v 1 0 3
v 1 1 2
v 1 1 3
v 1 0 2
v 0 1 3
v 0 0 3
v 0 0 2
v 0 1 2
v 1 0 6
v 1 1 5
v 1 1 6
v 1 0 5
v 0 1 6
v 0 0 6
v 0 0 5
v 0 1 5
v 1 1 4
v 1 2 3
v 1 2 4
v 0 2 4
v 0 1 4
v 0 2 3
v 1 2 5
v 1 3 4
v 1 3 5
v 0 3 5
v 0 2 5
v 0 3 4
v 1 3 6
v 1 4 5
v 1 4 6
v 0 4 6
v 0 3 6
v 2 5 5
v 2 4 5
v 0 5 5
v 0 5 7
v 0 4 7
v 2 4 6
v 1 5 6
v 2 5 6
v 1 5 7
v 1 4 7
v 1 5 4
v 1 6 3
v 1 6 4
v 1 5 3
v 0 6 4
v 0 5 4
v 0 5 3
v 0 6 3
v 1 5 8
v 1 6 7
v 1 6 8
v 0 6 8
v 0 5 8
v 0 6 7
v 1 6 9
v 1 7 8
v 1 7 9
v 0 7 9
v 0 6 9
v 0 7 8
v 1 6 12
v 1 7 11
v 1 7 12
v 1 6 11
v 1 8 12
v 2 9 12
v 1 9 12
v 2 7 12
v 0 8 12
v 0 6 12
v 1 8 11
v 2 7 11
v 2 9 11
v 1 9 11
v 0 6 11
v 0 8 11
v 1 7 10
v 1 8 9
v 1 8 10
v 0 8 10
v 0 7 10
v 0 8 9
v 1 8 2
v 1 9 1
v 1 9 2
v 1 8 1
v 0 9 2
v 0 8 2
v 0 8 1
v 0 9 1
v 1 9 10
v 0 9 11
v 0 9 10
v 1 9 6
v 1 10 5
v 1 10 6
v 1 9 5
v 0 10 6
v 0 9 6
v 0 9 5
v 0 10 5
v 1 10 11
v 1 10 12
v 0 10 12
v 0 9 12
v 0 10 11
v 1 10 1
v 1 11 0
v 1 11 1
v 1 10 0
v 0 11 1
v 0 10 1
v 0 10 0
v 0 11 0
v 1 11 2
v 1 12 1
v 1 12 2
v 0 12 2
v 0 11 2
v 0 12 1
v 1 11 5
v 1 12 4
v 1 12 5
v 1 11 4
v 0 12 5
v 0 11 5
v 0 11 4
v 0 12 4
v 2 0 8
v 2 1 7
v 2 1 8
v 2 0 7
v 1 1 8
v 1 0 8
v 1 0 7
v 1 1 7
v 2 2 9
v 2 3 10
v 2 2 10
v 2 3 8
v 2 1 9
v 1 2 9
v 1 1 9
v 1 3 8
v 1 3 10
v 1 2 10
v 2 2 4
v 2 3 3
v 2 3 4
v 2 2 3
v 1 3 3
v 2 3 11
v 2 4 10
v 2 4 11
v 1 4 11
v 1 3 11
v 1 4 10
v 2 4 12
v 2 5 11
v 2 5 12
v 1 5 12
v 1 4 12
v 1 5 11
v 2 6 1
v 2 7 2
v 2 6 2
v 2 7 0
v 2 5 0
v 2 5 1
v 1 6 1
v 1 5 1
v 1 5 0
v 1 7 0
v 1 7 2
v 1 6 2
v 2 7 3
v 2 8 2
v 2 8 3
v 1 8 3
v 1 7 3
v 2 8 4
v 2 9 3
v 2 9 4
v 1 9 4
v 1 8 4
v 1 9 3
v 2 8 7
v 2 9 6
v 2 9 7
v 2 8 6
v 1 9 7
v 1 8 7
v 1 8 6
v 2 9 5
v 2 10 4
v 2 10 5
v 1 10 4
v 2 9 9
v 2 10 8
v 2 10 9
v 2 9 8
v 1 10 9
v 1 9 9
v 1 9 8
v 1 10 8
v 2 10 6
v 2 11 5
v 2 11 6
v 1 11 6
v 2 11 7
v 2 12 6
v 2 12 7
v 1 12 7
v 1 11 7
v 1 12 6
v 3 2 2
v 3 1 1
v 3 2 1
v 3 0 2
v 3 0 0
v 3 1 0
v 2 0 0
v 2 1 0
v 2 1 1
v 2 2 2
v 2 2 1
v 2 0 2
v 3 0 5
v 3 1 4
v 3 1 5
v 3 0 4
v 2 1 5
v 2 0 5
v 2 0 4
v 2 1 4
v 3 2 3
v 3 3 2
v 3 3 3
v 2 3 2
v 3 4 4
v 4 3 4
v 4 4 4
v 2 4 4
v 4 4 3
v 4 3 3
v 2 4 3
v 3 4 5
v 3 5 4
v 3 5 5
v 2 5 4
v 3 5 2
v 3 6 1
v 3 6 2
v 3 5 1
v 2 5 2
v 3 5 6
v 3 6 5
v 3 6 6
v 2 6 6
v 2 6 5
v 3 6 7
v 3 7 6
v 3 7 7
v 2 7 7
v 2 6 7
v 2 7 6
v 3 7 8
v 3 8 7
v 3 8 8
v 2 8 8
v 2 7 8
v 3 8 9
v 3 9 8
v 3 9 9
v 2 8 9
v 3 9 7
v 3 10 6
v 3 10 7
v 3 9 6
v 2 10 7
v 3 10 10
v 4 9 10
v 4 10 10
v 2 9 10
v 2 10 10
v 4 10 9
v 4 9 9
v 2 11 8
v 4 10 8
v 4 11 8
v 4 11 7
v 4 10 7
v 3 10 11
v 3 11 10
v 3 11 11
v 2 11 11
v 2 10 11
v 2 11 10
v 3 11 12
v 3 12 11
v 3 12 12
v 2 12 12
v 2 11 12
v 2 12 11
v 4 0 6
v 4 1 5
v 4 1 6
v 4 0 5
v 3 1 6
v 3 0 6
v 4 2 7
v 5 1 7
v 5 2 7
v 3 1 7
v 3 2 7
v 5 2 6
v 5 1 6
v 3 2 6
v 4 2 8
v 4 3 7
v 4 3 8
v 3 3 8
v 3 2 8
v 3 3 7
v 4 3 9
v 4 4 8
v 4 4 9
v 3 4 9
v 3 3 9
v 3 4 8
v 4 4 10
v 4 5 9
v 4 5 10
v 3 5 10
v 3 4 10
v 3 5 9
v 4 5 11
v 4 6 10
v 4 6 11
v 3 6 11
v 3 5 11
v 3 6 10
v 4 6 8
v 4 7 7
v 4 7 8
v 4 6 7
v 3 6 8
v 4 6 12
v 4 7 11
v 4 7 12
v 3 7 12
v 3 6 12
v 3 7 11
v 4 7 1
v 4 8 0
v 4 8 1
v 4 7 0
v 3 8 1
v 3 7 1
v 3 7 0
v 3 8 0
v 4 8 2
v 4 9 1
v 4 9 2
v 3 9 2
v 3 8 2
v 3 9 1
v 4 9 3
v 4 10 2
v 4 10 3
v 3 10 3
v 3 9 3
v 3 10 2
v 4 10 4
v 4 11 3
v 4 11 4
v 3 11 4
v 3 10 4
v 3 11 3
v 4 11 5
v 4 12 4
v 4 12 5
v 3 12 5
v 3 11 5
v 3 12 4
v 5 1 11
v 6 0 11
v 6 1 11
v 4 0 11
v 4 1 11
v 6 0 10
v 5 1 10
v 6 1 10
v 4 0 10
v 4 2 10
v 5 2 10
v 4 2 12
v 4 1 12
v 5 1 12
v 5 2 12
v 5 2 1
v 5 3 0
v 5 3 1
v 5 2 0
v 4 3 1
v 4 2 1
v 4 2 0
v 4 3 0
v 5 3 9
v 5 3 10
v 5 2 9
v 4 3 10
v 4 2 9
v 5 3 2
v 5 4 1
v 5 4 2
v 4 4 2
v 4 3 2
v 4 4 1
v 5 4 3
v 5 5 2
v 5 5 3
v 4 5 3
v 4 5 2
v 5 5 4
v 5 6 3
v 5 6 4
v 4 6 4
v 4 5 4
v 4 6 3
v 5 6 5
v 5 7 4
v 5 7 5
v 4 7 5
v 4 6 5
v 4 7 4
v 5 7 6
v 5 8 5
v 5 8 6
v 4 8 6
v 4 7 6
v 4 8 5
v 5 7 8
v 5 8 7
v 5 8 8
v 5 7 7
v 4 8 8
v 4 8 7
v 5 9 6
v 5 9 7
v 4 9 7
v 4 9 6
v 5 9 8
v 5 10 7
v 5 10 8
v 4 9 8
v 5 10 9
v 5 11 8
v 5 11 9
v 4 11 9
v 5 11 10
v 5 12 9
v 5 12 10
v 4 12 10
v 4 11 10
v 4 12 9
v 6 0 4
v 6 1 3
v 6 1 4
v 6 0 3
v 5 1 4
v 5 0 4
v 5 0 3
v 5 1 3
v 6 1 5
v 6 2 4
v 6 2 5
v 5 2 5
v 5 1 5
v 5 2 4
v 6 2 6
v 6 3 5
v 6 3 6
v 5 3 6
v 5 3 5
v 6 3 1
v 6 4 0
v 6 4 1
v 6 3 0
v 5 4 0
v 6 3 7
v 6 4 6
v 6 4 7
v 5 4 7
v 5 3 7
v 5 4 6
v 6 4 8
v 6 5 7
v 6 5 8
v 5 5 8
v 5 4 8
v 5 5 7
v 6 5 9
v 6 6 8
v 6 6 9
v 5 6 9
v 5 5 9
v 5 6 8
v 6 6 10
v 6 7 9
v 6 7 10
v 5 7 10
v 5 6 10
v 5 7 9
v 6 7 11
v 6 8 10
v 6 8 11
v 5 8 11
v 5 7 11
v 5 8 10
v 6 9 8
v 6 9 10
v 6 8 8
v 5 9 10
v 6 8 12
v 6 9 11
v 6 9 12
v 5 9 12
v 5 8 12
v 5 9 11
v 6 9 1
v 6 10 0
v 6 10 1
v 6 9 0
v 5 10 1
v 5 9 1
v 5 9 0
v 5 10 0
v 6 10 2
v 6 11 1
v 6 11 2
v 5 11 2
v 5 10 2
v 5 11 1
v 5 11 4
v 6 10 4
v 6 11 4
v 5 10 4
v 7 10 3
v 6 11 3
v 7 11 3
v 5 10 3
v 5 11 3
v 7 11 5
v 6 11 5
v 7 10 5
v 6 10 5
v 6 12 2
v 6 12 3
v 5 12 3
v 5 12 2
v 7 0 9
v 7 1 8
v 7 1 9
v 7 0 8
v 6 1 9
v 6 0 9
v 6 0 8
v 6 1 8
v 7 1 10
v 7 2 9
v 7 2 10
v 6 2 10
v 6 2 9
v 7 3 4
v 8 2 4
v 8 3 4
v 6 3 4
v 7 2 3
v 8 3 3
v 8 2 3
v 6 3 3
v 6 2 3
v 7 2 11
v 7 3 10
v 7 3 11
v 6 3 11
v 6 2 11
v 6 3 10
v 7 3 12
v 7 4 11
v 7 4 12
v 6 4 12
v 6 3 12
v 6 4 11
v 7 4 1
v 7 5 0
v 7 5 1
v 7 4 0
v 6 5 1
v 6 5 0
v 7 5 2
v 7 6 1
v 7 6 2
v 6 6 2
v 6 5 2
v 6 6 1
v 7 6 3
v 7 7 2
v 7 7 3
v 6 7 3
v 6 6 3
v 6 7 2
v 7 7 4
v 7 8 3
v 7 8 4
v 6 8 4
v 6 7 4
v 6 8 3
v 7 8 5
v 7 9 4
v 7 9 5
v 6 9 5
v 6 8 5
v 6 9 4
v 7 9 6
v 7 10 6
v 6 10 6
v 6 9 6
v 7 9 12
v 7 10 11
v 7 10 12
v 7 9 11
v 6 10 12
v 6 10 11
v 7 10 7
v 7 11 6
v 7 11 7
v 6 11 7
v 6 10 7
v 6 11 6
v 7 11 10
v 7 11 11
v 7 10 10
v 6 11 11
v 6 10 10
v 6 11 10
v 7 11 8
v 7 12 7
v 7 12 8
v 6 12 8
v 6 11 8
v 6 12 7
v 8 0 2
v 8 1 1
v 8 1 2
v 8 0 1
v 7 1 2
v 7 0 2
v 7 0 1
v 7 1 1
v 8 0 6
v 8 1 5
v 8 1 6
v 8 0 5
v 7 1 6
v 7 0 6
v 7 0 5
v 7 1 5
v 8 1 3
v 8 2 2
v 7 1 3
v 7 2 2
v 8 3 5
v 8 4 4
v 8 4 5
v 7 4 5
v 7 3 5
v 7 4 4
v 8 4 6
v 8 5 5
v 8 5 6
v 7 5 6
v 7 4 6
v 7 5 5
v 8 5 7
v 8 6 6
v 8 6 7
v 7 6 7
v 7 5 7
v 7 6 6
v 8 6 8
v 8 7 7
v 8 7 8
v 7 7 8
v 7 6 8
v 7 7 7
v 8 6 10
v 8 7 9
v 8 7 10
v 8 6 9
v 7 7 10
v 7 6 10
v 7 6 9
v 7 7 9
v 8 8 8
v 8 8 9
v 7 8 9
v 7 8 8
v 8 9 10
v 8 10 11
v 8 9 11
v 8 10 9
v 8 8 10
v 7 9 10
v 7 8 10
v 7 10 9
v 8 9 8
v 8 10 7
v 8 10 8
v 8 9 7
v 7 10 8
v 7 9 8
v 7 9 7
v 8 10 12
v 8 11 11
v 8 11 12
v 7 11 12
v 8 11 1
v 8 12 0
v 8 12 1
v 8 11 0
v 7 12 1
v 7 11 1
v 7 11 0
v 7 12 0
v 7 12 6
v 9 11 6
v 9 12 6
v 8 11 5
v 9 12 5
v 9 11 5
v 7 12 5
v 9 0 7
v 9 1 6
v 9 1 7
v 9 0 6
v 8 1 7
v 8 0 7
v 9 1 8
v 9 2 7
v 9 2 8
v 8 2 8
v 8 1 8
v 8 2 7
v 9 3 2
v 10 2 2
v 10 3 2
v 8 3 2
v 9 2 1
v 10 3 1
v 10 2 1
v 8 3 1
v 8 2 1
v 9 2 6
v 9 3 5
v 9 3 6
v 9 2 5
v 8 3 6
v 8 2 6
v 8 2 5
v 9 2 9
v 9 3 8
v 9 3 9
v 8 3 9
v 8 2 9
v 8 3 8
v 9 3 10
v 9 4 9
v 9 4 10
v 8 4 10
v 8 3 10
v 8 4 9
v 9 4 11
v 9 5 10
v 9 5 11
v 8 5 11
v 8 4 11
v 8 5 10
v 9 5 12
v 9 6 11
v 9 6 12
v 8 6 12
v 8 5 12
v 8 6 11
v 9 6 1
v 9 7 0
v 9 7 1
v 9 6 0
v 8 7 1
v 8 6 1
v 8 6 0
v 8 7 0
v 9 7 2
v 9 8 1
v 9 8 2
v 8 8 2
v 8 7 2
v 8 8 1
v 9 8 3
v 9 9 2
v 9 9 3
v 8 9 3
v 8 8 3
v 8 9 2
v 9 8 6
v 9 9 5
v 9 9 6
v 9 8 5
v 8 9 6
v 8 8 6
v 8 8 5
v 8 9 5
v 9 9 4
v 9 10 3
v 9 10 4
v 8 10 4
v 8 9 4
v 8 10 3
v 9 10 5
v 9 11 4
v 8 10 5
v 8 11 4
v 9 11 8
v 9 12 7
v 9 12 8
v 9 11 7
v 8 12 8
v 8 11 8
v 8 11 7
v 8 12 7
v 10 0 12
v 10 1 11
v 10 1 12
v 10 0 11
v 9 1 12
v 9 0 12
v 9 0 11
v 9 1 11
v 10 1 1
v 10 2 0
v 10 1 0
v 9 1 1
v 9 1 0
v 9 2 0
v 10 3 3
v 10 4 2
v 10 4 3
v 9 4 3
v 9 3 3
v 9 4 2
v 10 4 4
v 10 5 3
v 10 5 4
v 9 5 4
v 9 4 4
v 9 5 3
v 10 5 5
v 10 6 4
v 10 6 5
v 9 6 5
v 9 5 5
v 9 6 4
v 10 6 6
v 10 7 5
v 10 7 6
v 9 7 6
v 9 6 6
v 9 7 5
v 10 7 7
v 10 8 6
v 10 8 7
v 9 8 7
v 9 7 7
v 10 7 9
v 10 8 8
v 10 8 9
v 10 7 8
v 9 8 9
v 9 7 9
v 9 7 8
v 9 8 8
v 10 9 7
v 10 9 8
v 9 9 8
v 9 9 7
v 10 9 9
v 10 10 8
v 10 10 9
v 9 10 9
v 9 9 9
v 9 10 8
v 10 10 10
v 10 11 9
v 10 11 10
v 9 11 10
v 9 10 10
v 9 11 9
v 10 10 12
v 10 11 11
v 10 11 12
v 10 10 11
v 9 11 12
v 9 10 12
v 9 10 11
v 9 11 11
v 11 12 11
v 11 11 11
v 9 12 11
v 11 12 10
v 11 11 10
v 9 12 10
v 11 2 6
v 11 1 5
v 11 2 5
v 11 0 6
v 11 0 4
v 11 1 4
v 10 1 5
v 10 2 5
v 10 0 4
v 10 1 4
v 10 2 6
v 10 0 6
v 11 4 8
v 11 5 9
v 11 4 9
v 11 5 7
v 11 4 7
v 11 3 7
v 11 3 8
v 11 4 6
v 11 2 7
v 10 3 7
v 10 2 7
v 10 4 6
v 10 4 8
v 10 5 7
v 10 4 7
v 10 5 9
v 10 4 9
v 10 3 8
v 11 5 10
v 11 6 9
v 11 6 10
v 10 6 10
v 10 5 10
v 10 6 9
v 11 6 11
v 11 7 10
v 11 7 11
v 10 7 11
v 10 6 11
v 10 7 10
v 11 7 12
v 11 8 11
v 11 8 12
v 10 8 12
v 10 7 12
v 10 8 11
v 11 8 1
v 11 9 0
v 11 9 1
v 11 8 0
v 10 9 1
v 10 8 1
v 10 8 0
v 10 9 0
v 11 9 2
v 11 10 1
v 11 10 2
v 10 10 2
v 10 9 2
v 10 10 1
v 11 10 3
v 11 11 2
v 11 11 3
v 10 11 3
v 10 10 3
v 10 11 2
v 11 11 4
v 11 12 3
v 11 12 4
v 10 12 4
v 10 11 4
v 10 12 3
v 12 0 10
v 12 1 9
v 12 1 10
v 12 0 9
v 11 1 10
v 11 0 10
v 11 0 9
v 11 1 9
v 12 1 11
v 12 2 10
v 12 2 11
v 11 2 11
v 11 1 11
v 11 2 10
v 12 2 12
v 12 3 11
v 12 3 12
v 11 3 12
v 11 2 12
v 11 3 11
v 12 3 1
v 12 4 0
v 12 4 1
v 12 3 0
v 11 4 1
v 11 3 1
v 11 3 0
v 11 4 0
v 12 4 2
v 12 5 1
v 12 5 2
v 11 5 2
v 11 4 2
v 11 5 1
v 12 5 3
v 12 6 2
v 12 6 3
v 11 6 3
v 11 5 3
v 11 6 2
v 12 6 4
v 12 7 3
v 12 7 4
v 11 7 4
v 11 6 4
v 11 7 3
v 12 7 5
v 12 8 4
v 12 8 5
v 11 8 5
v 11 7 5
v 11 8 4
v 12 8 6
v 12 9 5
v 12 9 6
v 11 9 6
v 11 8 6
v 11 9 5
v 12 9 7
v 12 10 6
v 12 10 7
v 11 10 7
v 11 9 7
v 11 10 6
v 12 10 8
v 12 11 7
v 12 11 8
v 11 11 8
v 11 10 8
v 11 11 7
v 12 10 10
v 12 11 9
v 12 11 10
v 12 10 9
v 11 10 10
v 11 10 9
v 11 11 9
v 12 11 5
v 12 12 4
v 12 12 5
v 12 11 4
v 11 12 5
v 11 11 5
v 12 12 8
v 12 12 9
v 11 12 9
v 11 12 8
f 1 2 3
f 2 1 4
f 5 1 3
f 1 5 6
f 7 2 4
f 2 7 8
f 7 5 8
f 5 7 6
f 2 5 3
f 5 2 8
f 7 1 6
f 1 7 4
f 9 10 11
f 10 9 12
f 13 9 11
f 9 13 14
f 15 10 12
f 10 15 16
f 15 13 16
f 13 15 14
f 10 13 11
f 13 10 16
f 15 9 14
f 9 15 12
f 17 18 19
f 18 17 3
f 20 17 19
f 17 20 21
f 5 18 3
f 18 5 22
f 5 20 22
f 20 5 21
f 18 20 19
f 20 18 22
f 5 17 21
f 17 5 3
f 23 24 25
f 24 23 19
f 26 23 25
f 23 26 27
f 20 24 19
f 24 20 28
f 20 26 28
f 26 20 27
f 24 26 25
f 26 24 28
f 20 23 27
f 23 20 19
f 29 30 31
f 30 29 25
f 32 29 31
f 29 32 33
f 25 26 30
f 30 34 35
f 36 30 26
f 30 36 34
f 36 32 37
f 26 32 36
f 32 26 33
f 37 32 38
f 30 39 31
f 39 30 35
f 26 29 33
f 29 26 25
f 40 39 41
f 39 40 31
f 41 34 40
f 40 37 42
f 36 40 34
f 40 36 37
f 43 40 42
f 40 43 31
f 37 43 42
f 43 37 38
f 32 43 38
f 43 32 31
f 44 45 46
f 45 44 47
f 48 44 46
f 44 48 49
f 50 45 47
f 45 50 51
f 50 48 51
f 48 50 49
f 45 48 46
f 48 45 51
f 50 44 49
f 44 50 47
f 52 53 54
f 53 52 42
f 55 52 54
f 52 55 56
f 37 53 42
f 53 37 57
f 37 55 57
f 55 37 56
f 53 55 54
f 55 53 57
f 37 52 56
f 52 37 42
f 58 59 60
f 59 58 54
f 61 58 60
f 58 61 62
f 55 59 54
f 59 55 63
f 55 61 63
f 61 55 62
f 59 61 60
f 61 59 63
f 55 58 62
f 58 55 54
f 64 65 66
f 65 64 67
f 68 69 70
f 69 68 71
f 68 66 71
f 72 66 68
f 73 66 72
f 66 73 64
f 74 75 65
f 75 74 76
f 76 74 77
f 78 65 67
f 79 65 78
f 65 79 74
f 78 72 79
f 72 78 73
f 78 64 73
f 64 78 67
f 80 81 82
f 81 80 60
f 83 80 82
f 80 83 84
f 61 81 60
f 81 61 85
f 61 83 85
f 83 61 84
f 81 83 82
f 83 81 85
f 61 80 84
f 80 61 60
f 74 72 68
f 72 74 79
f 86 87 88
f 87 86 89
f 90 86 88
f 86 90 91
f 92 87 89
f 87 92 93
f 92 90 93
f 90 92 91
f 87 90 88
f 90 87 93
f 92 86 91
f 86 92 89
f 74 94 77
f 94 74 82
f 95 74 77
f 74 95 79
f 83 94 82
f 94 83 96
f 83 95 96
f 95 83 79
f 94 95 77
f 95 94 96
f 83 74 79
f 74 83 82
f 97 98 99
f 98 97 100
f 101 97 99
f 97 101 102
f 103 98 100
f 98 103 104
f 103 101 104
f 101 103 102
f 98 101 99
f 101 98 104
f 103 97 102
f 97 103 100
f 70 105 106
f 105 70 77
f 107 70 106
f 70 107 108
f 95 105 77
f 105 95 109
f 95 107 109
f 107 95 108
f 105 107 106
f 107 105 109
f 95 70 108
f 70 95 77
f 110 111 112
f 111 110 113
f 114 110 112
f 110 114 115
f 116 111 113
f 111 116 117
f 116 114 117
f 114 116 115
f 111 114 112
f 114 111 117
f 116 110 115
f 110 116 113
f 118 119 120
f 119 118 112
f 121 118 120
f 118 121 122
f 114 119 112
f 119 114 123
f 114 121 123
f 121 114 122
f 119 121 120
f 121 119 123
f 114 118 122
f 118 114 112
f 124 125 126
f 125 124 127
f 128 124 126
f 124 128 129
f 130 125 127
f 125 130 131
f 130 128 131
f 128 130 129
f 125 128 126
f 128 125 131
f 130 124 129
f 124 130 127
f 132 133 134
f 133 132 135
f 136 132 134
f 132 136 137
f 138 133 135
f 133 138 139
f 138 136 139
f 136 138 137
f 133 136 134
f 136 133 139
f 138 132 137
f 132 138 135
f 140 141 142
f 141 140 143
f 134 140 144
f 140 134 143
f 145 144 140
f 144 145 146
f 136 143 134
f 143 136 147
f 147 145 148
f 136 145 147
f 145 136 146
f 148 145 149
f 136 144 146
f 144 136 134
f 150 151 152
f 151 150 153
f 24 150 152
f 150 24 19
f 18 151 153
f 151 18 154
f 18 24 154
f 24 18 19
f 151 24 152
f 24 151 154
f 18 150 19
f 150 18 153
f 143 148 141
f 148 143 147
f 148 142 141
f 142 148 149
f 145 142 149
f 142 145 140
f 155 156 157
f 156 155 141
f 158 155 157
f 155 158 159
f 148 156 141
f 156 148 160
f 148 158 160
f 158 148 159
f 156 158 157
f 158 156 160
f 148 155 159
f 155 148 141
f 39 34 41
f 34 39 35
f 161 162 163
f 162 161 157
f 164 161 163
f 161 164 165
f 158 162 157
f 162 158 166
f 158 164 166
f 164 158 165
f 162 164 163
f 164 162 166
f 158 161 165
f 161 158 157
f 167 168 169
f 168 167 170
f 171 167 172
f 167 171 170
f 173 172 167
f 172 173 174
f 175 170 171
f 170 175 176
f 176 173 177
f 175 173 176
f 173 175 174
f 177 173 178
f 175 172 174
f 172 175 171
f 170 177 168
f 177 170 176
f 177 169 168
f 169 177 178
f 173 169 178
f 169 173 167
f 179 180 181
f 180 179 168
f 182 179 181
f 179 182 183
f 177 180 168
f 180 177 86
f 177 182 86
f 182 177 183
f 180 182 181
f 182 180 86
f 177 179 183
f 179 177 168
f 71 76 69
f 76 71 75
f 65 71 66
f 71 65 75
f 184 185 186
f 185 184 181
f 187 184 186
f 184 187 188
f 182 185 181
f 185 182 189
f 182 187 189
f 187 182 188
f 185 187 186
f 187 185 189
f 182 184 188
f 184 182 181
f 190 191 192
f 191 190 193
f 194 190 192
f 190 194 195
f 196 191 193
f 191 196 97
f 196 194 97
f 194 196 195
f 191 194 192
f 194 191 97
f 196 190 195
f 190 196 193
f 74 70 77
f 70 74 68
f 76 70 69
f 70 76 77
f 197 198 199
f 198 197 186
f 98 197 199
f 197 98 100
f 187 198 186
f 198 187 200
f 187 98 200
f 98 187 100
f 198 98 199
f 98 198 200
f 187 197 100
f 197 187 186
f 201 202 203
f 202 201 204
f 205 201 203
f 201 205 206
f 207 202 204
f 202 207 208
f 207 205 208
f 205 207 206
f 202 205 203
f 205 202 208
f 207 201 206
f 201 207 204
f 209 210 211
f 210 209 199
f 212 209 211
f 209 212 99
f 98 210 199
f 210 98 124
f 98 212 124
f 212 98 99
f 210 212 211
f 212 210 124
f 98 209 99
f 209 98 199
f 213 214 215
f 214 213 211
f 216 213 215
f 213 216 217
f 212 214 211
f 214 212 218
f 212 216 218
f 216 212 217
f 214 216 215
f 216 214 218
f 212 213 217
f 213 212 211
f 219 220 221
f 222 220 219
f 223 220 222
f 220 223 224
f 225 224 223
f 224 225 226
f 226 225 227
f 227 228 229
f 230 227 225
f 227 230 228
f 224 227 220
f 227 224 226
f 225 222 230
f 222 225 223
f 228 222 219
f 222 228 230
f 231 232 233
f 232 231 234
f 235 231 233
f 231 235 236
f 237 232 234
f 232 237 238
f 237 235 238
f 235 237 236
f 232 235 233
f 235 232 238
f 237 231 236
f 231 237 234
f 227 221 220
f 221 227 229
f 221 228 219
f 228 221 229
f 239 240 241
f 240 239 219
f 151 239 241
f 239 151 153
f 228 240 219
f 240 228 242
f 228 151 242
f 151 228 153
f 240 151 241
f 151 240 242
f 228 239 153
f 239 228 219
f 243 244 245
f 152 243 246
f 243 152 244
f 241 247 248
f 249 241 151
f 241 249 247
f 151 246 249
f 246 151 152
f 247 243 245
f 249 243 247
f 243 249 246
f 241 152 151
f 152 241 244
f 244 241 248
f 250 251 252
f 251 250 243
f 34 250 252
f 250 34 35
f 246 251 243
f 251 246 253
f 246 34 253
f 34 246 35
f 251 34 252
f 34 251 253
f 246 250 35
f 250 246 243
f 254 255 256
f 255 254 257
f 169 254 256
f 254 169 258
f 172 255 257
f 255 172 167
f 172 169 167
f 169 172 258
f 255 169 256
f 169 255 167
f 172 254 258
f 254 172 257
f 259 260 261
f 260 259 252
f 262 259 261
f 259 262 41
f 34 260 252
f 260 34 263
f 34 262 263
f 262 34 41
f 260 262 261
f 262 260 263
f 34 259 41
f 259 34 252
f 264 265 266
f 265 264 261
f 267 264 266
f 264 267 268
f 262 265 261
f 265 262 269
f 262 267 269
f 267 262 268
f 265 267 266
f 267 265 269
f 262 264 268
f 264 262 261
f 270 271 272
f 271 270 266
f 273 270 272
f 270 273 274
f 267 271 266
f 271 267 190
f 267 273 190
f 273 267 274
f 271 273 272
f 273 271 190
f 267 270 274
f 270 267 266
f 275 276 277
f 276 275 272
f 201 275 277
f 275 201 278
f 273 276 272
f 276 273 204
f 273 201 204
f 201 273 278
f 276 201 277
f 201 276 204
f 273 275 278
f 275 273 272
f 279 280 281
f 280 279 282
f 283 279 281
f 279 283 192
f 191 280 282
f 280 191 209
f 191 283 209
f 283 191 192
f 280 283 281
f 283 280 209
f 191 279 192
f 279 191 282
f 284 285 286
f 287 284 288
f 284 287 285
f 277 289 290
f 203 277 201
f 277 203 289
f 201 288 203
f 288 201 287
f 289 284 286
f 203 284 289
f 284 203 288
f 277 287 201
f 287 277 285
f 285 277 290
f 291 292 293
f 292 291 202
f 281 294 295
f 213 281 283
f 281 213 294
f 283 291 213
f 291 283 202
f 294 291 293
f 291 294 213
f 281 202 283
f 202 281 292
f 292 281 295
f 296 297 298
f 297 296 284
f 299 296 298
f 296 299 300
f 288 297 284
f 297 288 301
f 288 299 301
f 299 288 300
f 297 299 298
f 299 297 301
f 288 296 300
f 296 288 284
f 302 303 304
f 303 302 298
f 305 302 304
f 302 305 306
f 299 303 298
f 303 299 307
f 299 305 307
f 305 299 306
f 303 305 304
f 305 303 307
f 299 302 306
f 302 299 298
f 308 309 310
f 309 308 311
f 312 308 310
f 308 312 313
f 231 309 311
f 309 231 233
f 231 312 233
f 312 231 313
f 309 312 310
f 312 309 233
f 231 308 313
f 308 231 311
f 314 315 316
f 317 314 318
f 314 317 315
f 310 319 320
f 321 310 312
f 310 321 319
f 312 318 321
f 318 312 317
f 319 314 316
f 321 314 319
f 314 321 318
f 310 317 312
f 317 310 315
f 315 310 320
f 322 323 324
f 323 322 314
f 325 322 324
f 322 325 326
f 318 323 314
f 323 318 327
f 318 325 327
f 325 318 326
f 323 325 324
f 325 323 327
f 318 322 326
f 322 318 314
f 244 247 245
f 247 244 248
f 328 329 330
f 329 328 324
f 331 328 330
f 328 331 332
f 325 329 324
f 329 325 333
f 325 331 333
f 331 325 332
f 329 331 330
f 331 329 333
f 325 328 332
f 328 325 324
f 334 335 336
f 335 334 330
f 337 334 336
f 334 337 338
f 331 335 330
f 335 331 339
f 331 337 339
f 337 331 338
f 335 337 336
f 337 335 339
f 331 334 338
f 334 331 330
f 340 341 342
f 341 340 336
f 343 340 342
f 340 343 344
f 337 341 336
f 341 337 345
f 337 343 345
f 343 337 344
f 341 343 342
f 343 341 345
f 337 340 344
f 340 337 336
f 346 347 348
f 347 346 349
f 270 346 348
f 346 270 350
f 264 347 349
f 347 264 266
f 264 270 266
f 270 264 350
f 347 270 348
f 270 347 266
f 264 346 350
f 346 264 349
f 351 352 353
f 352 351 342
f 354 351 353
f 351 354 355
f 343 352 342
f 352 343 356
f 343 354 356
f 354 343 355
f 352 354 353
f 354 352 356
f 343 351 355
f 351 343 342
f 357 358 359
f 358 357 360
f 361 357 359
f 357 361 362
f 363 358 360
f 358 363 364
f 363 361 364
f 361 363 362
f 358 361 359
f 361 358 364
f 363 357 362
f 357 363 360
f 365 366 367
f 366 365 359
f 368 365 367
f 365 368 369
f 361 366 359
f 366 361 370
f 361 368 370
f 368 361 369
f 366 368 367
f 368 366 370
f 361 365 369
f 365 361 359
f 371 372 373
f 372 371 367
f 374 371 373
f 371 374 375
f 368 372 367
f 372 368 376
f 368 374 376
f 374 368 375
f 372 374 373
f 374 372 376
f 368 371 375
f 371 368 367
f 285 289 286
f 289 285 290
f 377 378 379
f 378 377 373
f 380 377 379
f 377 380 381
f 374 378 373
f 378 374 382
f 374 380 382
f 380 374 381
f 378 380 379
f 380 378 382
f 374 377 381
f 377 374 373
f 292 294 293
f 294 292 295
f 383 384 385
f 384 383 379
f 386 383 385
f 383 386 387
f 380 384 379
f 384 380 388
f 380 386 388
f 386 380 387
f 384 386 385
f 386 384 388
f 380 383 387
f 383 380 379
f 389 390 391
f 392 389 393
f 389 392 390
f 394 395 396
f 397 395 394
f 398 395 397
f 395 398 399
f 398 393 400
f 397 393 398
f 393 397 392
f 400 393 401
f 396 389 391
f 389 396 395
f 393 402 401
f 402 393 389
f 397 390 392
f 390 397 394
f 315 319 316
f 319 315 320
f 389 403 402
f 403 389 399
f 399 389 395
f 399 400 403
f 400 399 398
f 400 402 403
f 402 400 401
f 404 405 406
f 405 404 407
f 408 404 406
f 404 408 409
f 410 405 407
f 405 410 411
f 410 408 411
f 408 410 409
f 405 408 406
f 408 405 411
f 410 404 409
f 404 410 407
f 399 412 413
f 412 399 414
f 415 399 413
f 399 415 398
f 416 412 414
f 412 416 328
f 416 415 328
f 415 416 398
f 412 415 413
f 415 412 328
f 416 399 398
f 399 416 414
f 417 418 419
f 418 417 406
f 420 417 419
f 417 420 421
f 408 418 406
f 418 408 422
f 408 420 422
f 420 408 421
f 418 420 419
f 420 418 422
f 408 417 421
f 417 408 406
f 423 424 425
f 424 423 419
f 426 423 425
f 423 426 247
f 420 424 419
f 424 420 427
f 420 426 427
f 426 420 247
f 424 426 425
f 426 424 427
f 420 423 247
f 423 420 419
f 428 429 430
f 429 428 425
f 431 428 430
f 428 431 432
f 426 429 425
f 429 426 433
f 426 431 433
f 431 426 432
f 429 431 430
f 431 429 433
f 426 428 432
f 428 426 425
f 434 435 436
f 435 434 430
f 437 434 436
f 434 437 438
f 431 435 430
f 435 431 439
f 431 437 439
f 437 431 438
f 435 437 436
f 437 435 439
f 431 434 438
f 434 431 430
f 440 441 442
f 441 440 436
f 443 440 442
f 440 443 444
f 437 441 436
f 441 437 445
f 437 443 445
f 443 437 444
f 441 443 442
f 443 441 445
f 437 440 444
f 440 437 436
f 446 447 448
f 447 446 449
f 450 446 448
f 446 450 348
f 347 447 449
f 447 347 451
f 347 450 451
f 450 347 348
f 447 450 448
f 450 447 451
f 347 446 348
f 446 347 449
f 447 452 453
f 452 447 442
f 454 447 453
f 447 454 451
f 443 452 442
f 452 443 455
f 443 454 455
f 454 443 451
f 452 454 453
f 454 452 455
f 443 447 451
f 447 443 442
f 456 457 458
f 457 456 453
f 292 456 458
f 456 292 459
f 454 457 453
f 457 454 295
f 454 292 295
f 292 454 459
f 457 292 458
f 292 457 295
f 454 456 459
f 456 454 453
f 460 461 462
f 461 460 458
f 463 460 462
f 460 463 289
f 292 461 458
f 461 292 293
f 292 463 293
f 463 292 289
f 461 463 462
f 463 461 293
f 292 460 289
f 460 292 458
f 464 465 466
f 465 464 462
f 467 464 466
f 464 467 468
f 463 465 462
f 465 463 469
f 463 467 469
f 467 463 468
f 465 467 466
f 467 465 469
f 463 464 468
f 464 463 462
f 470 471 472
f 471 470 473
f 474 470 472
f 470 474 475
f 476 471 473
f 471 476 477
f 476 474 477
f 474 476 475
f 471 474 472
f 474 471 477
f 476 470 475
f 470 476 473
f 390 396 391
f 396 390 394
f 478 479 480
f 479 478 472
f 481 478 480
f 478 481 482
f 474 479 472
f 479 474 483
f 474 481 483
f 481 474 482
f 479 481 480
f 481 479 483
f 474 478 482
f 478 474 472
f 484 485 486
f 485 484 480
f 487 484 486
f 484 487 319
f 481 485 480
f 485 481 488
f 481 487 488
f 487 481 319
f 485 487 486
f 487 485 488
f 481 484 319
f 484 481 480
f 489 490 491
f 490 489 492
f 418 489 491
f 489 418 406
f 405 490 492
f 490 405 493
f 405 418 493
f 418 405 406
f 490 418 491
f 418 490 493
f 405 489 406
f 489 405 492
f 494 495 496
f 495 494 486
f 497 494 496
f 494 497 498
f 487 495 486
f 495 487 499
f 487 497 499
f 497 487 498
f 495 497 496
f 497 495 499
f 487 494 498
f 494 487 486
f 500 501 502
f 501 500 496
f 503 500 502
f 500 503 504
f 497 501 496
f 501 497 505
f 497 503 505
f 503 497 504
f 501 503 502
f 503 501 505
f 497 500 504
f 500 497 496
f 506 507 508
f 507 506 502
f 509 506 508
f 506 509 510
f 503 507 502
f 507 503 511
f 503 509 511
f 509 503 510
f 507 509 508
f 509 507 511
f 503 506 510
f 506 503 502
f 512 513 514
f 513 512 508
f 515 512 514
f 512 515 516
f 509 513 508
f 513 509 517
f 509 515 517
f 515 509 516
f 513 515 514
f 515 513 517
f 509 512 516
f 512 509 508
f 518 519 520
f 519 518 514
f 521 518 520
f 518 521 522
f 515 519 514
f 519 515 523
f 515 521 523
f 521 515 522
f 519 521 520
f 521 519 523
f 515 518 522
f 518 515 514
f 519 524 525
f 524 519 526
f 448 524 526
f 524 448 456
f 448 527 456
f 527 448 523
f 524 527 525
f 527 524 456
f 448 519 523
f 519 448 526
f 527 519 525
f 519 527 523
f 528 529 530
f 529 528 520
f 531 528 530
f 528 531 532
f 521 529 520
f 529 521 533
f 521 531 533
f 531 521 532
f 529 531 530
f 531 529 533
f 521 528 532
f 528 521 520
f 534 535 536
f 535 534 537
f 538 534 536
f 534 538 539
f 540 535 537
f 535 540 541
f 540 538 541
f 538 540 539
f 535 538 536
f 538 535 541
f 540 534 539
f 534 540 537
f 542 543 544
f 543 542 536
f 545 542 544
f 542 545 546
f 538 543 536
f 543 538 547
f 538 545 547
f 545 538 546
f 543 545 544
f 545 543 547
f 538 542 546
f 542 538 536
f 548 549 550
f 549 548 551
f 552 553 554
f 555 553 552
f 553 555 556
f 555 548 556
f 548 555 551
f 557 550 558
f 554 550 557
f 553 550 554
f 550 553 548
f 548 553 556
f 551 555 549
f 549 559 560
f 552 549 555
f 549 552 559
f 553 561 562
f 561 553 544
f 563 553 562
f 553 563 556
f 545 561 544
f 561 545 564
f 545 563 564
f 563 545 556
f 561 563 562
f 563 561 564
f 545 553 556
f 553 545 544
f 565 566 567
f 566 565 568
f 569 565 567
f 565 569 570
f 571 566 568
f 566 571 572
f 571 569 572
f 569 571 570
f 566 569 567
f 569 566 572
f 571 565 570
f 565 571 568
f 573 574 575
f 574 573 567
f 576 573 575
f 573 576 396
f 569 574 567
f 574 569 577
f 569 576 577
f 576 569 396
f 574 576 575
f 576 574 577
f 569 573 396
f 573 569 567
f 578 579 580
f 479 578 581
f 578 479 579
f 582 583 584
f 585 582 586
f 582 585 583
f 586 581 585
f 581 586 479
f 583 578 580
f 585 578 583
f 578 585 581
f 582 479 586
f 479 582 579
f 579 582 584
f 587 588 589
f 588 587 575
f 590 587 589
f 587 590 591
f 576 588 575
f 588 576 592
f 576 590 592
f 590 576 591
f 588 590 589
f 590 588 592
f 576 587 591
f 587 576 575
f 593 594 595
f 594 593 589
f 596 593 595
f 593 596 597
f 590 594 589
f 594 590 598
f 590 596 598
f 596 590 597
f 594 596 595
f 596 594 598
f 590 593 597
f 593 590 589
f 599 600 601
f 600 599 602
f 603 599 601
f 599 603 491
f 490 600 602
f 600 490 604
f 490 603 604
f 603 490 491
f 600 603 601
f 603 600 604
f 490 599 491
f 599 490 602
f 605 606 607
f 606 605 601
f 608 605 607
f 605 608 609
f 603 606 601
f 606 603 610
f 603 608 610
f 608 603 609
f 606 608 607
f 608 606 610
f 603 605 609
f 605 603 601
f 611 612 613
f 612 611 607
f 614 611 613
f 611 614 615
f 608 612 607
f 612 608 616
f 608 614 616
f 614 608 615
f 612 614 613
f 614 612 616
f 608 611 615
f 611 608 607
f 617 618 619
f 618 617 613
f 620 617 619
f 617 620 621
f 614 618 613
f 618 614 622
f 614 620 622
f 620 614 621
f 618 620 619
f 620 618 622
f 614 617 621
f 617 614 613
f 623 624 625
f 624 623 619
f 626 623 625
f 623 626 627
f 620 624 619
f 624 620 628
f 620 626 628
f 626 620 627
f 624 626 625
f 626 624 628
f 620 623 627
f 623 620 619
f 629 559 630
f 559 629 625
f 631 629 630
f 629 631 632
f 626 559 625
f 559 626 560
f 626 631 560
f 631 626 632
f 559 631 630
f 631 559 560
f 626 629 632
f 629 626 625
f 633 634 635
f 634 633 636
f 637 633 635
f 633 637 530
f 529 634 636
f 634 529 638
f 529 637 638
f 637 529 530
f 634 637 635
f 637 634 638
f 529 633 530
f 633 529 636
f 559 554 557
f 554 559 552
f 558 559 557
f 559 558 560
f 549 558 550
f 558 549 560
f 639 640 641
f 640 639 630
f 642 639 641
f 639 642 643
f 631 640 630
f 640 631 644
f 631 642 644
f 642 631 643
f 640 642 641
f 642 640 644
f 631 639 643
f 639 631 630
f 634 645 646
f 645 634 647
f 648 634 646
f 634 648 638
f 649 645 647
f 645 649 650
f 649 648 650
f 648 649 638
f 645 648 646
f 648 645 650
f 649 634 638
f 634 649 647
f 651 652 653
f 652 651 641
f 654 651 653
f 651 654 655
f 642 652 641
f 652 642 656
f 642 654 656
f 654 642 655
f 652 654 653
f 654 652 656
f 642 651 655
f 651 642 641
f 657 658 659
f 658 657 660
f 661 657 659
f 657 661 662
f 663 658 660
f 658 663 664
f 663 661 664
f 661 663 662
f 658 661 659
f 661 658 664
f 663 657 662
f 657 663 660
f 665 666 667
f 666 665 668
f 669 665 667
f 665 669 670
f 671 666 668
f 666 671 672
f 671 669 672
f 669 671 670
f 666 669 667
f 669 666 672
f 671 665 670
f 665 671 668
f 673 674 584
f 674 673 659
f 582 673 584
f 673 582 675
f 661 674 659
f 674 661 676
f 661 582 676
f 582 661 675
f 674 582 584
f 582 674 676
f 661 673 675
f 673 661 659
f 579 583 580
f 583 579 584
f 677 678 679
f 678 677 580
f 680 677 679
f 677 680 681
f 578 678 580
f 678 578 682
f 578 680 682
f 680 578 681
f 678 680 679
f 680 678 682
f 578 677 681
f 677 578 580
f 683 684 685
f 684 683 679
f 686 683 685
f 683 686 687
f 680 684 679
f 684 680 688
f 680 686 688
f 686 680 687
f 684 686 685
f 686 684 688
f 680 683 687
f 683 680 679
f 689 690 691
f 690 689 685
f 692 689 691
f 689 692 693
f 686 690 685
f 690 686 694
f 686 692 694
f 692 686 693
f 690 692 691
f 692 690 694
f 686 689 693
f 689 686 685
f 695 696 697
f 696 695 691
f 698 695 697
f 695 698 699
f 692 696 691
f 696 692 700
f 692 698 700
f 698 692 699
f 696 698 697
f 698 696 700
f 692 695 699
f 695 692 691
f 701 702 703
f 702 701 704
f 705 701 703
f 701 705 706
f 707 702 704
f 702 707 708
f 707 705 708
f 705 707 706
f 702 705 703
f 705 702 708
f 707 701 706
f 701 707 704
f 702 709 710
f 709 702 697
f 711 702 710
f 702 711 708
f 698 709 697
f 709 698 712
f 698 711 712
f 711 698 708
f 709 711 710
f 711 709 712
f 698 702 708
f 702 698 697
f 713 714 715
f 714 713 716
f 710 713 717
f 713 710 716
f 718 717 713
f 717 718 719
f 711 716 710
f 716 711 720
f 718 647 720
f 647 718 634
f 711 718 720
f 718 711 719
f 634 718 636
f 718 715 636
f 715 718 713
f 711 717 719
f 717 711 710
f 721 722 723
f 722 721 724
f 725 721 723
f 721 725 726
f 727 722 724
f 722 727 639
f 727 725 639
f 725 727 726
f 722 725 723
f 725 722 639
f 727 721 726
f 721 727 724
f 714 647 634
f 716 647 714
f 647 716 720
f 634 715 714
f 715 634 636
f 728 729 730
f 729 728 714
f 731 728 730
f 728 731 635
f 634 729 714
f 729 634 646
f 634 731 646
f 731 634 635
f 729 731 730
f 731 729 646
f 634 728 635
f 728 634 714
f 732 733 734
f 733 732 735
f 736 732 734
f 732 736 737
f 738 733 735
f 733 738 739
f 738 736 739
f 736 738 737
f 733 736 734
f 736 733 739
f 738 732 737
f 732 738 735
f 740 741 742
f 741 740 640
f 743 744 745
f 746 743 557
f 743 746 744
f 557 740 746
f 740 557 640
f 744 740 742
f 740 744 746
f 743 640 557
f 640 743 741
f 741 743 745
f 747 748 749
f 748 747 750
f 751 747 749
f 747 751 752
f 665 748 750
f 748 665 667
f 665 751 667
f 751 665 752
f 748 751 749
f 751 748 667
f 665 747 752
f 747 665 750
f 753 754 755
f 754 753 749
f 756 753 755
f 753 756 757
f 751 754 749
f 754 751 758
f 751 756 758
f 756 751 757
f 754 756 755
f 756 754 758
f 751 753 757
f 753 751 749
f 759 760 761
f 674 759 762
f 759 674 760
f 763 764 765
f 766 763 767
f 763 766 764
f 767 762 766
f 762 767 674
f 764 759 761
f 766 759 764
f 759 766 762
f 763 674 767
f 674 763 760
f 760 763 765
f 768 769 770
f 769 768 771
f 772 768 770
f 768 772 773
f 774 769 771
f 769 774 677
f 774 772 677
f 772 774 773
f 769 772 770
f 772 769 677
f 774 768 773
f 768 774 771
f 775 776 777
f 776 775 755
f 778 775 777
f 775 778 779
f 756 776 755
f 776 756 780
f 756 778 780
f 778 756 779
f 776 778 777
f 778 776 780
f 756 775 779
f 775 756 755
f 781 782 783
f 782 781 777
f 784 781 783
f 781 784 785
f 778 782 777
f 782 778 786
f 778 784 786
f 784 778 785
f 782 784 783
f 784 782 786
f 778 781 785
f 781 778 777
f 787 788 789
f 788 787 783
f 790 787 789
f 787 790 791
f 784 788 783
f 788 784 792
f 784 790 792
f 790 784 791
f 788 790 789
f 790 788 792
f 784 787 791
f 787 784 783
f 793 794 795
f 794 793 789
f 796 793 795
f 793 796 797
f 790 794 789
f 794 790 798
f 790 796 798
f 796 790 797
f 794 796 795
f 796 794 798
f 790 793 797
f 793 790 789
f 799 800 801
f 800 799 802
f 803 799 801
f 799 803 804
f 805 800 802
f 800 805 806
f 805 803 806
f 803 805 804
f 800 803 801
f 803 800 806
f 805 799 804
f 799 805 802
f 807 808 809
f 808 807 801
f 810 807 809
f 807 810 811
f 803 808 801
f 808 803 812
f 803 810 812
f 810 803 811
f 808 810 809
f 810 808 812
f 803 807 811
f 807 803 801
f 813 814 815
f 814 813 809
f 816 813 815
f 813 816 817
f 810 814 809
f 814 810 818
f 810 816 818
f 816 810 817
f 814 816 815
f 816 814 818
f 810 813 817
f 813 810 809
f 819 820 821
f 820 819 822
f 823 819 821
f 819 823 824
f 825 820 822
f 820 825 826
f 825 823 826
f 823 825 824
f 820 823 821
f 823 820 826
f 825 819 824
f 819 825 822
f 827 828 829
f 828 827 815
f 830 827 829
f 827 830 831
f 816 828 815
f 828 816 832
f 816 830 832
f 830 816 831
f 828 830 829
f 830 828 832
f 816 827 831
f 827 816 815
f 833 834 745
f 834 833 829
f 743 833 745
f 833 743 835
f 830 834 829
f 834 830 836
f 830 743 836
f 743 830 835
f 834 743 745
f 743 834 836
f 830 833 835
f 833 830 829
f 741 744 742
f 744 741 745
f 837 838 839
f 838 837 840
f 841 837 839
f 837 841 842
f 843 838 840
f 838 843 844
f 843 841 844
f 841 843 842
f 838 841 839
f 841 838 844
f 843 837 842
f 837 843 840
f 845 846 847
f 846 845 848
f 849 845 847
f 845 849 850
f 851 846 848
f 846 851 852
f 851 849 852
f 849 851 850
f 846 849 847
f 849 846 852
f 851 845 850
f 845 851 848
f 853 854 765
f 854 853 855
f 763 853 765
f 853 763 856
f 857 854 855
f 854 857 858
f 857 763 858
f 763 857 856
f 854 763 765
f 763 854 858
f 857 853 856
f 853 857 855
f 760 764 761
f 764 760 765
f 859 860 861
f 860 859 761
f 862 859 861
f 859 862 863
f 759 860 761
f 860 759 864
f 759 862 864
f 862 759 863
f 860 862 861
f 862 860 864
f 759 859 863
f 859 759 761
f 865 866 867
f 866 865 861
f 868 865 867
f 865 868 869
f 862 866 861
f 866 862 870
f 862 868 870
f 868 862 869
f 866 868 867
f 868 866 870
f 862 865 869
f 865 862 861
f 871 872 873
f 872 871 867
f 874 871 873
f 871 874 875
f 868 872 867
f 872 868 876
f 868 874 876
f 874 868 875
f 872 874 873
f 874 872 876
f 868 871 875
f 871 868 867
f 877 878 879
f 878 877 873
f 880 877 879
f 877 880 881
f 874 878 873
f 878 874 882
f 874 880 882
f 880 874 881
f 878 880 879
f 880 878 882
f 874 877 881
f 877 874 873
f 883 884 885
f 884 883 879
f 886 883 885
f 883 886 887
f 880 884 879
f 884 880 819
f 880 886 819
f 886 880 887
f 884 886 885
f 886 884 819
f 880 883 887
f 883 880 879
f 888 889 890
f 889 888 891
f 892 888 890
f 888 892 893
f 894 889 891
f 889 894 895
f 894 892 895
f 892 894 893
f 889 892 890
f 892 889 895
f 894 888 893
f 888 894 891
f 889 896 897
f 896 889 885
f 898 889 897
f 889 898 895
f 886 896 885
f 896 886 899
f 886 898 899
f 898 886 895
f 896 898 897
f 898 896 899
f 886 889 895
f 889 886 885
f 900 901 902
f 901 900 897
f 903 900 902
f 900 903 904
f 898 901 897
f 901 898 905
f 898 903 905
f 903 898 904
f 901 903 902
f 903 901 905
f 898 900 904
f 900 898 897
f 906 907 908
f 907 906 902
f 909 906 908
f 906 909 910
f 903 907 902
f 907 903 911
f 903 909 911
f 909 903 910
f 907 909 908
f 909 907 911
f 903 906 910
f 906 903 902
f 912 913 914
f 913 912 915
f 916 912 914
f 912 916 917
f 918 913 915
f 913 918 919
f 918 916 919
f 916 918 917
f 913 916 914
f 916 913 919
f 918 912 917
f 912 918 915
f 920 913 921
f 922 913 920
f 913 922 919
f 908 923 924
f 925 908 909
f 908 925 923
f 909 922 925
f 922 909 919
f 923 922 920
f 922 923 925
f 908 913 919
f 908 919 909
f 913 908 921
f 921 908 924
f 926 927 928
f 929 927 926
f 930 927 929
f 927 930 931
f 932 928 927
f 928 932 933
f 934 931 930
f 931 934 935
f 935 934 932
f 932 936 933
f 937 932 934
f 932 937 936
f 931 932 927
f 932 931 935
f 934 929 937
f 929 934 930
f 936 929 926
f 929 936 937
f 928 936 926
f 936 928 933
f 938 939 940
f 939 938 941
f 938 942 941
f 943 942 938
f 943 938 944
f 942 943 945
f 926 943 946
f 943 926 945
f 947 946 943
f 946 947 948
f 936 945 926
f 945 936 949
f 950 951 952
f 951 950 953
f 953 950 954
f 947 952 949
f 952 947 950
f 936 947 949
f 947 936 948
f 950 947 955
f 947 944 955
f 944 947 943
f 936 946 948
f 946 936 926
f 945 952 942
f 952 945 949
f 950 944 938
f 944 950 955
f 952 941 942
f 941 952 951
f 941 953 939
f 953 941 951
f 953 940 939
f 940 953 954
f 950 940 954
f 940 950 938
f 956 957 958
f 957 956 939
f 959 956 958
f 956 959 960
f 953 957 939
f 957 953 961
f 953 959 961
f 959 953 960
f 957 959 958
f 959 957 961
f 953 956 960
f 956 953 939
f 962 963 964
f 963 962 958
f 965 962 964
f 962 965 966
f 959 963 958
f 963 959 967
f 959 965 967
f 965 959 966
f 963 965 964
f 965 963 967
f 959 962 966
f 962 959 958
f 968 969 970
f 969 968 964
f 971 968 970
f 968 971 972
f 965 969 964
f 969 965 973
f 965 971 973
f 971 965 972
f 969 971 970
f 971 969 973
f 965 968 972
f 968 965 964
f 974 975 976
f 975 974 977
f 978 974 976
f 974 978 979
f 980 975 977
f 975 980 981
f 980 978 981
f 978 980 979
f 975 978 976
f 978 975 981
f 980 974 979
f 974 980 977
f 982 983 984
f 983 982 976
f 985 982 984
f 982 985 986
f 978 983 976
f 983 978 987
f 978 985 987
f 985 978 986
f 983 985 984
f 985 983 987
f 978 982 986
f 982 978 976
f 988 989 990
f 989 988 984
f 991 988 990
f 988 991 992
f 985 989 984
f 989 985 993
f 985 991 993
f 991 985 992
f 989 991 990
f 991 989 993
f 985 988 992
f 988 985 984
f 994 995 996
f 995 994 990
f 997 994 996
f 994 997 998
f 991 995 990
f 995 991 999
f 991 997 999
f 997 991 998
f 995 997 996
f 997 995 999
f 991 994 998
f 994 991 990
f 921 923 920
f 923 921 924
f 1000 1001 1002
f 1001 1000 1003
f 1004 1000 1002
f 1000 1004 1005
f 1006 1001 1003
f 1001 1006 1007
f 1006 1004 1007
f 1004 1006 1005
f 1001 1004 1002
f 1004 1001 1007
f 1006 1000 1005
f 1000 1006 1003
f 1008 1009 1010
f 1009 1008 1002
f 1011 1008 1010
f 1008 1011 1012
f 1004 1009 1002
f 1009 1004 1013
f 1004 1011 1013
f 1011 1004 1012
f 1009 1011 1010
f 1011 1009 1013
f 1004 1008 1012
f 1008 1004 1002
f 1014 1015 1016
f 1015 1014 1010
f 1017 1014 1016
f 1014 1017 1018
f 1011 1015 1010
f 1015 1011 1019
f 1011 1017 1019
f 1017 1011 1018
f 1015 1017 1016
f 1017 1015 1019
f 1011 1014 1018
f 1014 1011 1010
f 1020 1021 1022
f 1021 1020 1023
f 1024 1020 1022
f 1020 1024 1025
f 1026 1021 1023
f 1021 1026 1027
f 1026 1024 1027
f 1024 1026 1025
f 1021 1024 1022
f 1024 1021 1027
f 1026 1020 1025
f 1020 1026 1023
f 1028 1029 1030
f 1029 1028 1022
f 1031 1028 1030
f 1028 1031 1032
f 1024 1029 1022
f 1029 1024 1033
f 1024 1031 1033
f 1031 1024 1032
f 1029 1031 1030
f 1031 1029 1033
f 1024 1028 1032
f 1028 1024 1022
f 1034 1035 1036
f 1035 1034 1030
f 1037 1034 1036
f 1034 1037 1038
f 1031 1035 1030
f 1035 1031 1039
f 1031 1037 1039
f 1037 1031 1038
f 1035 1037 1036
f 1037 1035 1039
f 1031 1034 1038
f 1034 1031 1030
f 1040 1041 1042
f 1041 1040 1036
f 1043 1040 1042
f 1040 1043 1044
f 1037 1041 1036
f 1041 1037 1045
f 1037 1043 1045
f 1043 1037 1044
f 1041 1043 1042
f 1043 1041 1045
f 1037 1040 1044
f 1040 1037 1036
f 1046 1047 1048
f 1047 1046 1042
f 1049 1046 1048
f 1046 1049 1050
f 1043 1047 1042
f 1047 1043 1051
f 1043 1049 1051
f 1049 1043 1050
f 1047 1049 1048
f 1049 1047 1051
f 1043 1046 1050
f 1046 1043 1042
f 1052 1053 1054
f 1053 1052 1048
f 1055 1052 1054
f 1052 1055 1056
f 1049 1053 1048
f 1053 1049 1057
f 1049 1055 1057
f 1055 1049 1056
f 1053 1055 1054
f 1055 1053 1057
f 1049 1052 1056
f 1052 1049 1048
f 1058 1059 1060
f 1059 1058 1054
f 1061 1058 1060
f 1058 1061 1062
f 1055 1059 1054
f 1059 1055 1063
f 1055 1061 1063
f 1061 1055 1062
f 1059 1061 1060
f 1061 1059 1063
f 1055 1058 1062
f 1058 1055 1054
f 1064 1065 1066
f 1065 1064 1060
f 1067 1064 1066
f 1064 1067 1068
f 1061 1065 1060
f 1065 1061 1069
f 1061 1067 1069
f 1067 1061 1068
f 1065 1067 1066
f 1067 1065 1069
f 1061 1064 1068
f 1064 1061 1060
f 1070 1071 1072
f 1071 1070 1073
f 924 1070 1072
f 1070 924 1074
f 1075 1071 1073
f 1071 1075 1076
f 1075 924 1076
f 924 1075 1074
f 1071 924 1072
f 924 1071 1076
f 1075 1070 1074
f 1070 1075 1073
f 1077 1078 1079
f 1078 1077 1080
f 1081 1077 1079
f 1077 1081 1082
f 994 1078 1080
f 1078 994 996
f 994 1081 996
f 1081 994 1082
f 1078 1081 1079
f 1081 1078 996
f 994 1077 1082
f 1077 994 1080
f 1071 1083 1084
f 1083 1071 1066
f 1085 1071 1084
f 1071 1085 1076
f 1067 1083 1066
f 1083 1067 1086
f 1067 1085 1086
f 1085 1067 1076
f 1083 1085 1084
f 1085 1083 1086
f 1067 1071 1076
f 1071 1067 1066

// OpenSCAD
union() {
    translate([0, 0, 2]) cube([1, 1, 1]);
    translate([0, 0, 5]) cube([1, 1, 1]);
    translate([0, 1, 3]) cube([1, 1, 1]);
    translate([0, 2, 4]) cube([1, 1, 1]);
    translate([0, 3, 5]) cube([1, 1, 1]);
    translate([0, 4, 5]) cube([1, 1, 1]);
    translate([0, 4, 6]) cube([1, 1, 1]);
    translate([0, 5, 3]) cube([1, 1, 1]);
    translate([0, 5, 7]) cube([1, 1, 1]);
    translate([0, 6, 8]) cube([1, 1, 1]);
    translate([0, 6, 11]) cube([1, 1, 1]);
    translate([0, 7, 9]) cube([1, 1, 1]);
    translate([0, 7, 11]) cube([1, 1, 1]);
    translate([0, 8, 1]) cube([1, 1, 1]);
    translate([0, 8, 10]) cube([1, 1, 1]);
    translate([0, 9, 5]) cube([1, 1, 1]);
    translate([0, 9, 11]) cube([1, 1, 1]);
    translate([0, 10, 0]) cube([1, 1, 1]);
    translate([0, 11, 1]) cube([1, 1, 1]);
    translate([0, 11, 4]) cube([1, 1, 1]);
    translate([1, 0, 7]) cube([1, 1, 1]);
    translate([1, 1, 8]) cube([1, 1, 1]);
    translate([1, 2, 3]) cube([1, 1, 1]);
    translate([1, 2, 8]) cube([1, 1, 1]);
    translate([1, 2, 9]) cube([1, 1, 1]);
    translate([1, 3, 10]) cube([1, 1, 1]);
    translate([1, 4, 5]) cube([1, 1, 1]);
    translate([1, 4, 11]) cube([1, 1, 1]);
    translate([1, 5, 0]) cube([1, 1, 1]);
    translate([1, 6, 0]) cube([1, 1, 1]);
    translate([1, 6, 1]) cube([1, 1, 1]);
    translate([1, 7, 2]) cube([1, 1, 1]);
    translate([1, 7, 11]) cube([1, 1, 1]);
    translate([1, 8, 3]) cube([1, 1, 1]);
    translate([1, 8, 6]) cube([1, 1, 1]);
    translate([1, 8, 11]) cube([1, 1, 1]);
    translate([1, 9, 4]) cube([1, 1, 1]);
    translate([1, 9, 8]) cube([1, 1, 1]);
    translate([1, 10, 5]) cube([1, 1, 1]);
    translate([1, 11, 6]) cube([1, 1, 1]);
    translate([2, 0, 0]) cube([1, 1, 1]);
    translate([2, 0, 1]) cube([1, 1, 1]);
    translate([2, 0, 4]) cube([1, 1, 1]);
    translate([2, 1, 1]) cube([1, 1, 1]);
    translate([2, 2, 2]) cube([1, 1, 1]);
    translate([2, 3, 3]) cube([1, 1, 1]);
    translate([2, 4, 4]) cube([1, 1, 1]);
    translate([2, 5, 1]) cube([1, 1, 1]);
    translate([2, 5, 5]) cube([1, 1, 1]);
    translate([2, 6, 6]) cube([1, 1, 1]);
    translate([2, 7, 7]) cube([1, 1, 1]);
    translate([2, 8, 8]) cube([1, 1, 1]);
    translate([2, 9, 6]) cube([1, 1, 1]);
    translate([2, 9, 9]) cube([1, 1, 1]);
    translate([2, 10, 7]) cube([1, 1, 1]);
    translate([2, 10, 10]) cube([1, 1, 1]);
    translate([2, 11, 11]) cube([1, 1, 1]);
    translate([3, 0, 5]) cube([1, 1, 1]);
    translate([3, 1, 6]) cube([1, 1, 1]);
    translate([3, 2, 7]) cube([1, 1, 1]);
    translate([3, 3, 3]) cube([1, 1, 1]);
    translate([3, 3, 8]) cube([1, 1, 1]);
    translate([3, 4, 9]) cube([1, 1, 1]);
    translate([3, 5, 10]) cube([1, 1, 1]);
    translate([3, 6, 7]) cube([1, 1, 1]);
    translate([3, 6, 11]) cube([1, 1, 1]);
    translate([3, 7, 0]) cube([1, 1, 1]);
    translate([3, 8, 1]) cube([1, 1, 1]);
    translate([3, 9, 2]) cube([1, 1, 1]);
    translate([3, 9, 9]) cube([1, 1, 1]);
    translate([3, 10, 3]) cube([1, 1, 1]);
    translate([3, 10, 7]) cube([1, 1, 1]);
    translate([3, 11, 4]) cube([1, 1, 1]);
    translate([4, 0, 10]) cube([1, 1, 1]);
    translate([4, 1, 6]) cube([1, 1, 1]);
    translate([4, 1, 10]) cube([1, 1, 1]);
    translate([4, 1, 11]) cube([1, 1, 1]);
    translate([4, 2, 0]) cube([1, 1, 1]);
    translate([4, 2, 9]) cube([1, 1, 1]);
    translate([4, 3, 1]) cube([1, 1, 1]);
    translate([4, 4, 2]) cube([1, 1, 1]);
    translate([4, 5, 3]) cube([1, 1, 1]);
    translate([4, 6, 4]) cube([1, 1, 1]);
    translate([4, 7, 5]) cube([1, 1, 1]);
    translate([4, 7, 7]) cube([1, 1, 1]);
    translate([4, 8, 6]) cube([1, 1, 1]);
    translate([4, 9, 7]) cube([1, 1, 1]);
    translate([4, 10, 8]) cube([1, 1, 1]);
    translate([4, 11, 9]) cube([1, 1, 1]);
    translate([5, 0, 3]) cube([1, 1, 1]);
    translate([5, 0, 10]) cube([1, 1, 1]);
    translate([5, 1, 4]) cube([1, 1, 1]);
    translate([5, 2, 5]) cube([1, 1, 1]);
    translate([5, 3, 0]) cube([1, 1, 1]);
    translate([5, 3, 6]) cube([1, 1, 1]);
    translate([5, 4, 7]) cube([1, 1, 1]);
    translate([5, 5, 8]) cube([1, 1, 1]);
    translate([5, 6, 9]) cube([1, 1, 1]);
    translate([5, 7, 10]) cube([1, 1, 1]);
    translate([5, 8, 8]) cube([1, 1, 1]);
    translate([5, 8, 9]) cube([1, 1, 1]);
    translate([5, 8, 11]) cube([1, 1, 1]);
    translate([5, 9, 0]) cube([1, 1, 1]);
    translate([5, 10, 1]) cube([1, 1, 1]);
    translate([5, 10, 3]) cube([1, 1, 1]);
    translate([5, 11, 2]) cube([1, 1, 1]);
    translate([6, 0, 8]) cube([1, 1, 1]);
    translate([6, 1, 9]) cube([1, 1, 1]);
    translate([6, 2, 3]) cube([1, 1, 1]);
    translate([6, 2, 10]) cube([1, 1, 1]);
    translate([6, 3, 11]) cube([1, 1, 1]);
    translate([6, 4, 0]) cube([1, 1, 1]);
    translate([6, 5, 1]) cube([1, 1, 1]);
    translate([6, 6, 2]) cube([1, 1, 1]);
    translate([6, 7, 3]) cube([1, 1, 1]);
    translate([6, 8, 4]) cube([1, 1, 1]);
    translate([6, 9, 5]) cube([1, 1, 1]);
    translate([6, 9, 11]) cube([1, 1, 1]);
    translate([6, 10, 3]) cube([1, 1, 1]);
    translate([6, 10, 4]) cube([1, 1, 1]);
    translate([6, 10, 6]) cube([1, 1, 1]);
    translate([6, 10, 10]) cube([1, 1, 1]);
    translate([6, 11, 7]) cube([1, 1, 1]);
    translate([7, 0, 1]) cube([1, 1, 1]);
    translate([7, 0, 5]) cube([1, 1, 1]);
    translate([7, 1, 2]) cube([1, 1, 1]);
    translate([7, 2, 3]) cube([1, 1, 1]);
    translate([7, 3, 4]) cube([1, 1, 1]);
    translate([7, 4, 5]) cube([1, 1, 1]);
    translate([7, 5, 6]) cube([1, 1, 1]);
    translate([7, 6, 7]) cube([1, 1, 1]);
    translate([7, 6, 9]) cube([1, 1, 1]);
    translate([7, 7, 8]) cube([1, 1, 1]);
    translate([7, 8, 9]) cube([1, 1, 1]);
    translate([7, 9, 7]) cube([1, 1, 1]);
    translate([7, 9, 9]) cube([1, 1, 1]);
    translate([7, 9, 10]) cube([1, 1, 1]);
    translate([7, 10, 11]) cube([1, 1, 1]);
    translate([7, 11, 0]) cube([1, 1, 1]);
    translate([7, 11, 5]) cube([1, 1, 1]);
    translate([8, 0, 6]) cube([1, 1, 1]);
    translate([8, 1, 7]) cube([1, 1, 1]);
    translate([8, 2, 1]) cube([1, 1, 1]);
    translate([8, 2, 5]) cube([1, 1, 1]);
    translate([8, 2, 8]) cube([1, 1, 1]);
    translate([8, 3, 9]) cube([1, 1, 1]);
    translate([8, 4, 10]) cube([1, 1, 1]);
    translate([8, 5, 11]) cube([1, 1, 1]);
    translate([8, 6, 0]) cube([1, 1, 1]);
    translate([8, 7, 1]) cube([1, 1, 1]);
    translate([8, 8, 2]) cube([1, 1, 1]);
    translate([8, 8, 5]) cube([1, 1, 1]);
    translate([8, 9, 3]) cube([1, 1, 1]);
    translate([8, 10, 4]) cube([1, 1, 1]);
    translate([8, 11, 5]) cube([1, 1, 1]);
    translate([8, 11, 7]) cube([1, 1, 1]);
    translate([9, 0, 11]) cube([1, 1, 1]);
    translate([9, 1, 0]) cube([1, 1, 1]);
    translate([9, 2, 1]) cube([1, 1, 1]);
    translate([9, 3, 2]) cube([1, 1, 1]);
    translate([9, 4, 3]) cube([1, 1, 1]);
    translate([9, 5, 4]) cube([1, 1, 1]);
    translate([9, 6, 5]) cube([1, 1, 1]);
    translate([9, 7, 6]) cube([1, 1, 1]);
    translate([9, 7, 8]) cube([1, 1, 1]);
    translate([9, 8, 7]) cube([1, 1, 1]);
    translate([9, 9, 8]) cube([1, 1, 1]);
    translate([9, 10, 9]) cube([1, 1, 1]);
    translate([9, 10, 11]) cube([1, 1, 1]);
    translate([9, 11, 10]) cube([1, 1, 1]);
    translate([10, 0, 4]) cube([1, 1, 1]);
    translate([10, 0, 5]) cube([1, 1, 1]);
    translate([10, 1, 5]) cube([1, 1, 1]);
    translate([10, 2, 6]) cube([1, 1, 1]);
    translate([10, 3, 6]) cube([1, 1, 1]);
    translate([10, 3, 7]) cube([1, 1, 1]);
    translate([10, 4, 7]) cube([1, 1, 1]);
    translate([10, 4, 8]) cube([1, 1, 1]);
    translate([10, 5, 9]) cube([1, 1, 1]);
    translate([10, 6, 10]) cube([1, 1, 1]);
    translate([10, 7, 11]) cube([1, 1, 1]);
    translate([10, 8, 0]) cube([1, 1, 1]);
    translate([10, 9, 1]) cube([1, 1, 1]);
    translate([10, 10, 2]) cube([1, 1, 1]);
    translate([10, 11, 3]) cube([1, 1, 1]);
    translate([10, 11, 10]) cube([1, 1, 1]);
    translate([11, 0, 9]) cube([1, 1, 1]);
    translate([11, 1, 10]) cube([1, 1, 1]);
    translate([11, 2, 11]) cube([1, 1, 1]);
    translate([11, 3, 0]) cube([1, 1, 1]);
    translate([11, 4, 1]) cube([1, 1, 1]);
    translate([11, 5, 2]) cube([1, 1, 1]);
    translate([11, 6, 3]) cube([1, 1, 1]);
    translate([11, 7, 4]) cube([1, 1, 1]);
    translate([11, 8, 5]) cube([1, 1, 1]);
    translate([11, 9, 6]) cube([1, 1, 1]);
    translate([11, 10, 7]) cube([1, 1, 1]);
    translate([11, 10, 9]) cube([1, 1, 1]);
    translate([11, 11, 4]) cube([1, 1, 1]);
    translate([11, 11, 8]) cube([1, 1, 1]);
}
